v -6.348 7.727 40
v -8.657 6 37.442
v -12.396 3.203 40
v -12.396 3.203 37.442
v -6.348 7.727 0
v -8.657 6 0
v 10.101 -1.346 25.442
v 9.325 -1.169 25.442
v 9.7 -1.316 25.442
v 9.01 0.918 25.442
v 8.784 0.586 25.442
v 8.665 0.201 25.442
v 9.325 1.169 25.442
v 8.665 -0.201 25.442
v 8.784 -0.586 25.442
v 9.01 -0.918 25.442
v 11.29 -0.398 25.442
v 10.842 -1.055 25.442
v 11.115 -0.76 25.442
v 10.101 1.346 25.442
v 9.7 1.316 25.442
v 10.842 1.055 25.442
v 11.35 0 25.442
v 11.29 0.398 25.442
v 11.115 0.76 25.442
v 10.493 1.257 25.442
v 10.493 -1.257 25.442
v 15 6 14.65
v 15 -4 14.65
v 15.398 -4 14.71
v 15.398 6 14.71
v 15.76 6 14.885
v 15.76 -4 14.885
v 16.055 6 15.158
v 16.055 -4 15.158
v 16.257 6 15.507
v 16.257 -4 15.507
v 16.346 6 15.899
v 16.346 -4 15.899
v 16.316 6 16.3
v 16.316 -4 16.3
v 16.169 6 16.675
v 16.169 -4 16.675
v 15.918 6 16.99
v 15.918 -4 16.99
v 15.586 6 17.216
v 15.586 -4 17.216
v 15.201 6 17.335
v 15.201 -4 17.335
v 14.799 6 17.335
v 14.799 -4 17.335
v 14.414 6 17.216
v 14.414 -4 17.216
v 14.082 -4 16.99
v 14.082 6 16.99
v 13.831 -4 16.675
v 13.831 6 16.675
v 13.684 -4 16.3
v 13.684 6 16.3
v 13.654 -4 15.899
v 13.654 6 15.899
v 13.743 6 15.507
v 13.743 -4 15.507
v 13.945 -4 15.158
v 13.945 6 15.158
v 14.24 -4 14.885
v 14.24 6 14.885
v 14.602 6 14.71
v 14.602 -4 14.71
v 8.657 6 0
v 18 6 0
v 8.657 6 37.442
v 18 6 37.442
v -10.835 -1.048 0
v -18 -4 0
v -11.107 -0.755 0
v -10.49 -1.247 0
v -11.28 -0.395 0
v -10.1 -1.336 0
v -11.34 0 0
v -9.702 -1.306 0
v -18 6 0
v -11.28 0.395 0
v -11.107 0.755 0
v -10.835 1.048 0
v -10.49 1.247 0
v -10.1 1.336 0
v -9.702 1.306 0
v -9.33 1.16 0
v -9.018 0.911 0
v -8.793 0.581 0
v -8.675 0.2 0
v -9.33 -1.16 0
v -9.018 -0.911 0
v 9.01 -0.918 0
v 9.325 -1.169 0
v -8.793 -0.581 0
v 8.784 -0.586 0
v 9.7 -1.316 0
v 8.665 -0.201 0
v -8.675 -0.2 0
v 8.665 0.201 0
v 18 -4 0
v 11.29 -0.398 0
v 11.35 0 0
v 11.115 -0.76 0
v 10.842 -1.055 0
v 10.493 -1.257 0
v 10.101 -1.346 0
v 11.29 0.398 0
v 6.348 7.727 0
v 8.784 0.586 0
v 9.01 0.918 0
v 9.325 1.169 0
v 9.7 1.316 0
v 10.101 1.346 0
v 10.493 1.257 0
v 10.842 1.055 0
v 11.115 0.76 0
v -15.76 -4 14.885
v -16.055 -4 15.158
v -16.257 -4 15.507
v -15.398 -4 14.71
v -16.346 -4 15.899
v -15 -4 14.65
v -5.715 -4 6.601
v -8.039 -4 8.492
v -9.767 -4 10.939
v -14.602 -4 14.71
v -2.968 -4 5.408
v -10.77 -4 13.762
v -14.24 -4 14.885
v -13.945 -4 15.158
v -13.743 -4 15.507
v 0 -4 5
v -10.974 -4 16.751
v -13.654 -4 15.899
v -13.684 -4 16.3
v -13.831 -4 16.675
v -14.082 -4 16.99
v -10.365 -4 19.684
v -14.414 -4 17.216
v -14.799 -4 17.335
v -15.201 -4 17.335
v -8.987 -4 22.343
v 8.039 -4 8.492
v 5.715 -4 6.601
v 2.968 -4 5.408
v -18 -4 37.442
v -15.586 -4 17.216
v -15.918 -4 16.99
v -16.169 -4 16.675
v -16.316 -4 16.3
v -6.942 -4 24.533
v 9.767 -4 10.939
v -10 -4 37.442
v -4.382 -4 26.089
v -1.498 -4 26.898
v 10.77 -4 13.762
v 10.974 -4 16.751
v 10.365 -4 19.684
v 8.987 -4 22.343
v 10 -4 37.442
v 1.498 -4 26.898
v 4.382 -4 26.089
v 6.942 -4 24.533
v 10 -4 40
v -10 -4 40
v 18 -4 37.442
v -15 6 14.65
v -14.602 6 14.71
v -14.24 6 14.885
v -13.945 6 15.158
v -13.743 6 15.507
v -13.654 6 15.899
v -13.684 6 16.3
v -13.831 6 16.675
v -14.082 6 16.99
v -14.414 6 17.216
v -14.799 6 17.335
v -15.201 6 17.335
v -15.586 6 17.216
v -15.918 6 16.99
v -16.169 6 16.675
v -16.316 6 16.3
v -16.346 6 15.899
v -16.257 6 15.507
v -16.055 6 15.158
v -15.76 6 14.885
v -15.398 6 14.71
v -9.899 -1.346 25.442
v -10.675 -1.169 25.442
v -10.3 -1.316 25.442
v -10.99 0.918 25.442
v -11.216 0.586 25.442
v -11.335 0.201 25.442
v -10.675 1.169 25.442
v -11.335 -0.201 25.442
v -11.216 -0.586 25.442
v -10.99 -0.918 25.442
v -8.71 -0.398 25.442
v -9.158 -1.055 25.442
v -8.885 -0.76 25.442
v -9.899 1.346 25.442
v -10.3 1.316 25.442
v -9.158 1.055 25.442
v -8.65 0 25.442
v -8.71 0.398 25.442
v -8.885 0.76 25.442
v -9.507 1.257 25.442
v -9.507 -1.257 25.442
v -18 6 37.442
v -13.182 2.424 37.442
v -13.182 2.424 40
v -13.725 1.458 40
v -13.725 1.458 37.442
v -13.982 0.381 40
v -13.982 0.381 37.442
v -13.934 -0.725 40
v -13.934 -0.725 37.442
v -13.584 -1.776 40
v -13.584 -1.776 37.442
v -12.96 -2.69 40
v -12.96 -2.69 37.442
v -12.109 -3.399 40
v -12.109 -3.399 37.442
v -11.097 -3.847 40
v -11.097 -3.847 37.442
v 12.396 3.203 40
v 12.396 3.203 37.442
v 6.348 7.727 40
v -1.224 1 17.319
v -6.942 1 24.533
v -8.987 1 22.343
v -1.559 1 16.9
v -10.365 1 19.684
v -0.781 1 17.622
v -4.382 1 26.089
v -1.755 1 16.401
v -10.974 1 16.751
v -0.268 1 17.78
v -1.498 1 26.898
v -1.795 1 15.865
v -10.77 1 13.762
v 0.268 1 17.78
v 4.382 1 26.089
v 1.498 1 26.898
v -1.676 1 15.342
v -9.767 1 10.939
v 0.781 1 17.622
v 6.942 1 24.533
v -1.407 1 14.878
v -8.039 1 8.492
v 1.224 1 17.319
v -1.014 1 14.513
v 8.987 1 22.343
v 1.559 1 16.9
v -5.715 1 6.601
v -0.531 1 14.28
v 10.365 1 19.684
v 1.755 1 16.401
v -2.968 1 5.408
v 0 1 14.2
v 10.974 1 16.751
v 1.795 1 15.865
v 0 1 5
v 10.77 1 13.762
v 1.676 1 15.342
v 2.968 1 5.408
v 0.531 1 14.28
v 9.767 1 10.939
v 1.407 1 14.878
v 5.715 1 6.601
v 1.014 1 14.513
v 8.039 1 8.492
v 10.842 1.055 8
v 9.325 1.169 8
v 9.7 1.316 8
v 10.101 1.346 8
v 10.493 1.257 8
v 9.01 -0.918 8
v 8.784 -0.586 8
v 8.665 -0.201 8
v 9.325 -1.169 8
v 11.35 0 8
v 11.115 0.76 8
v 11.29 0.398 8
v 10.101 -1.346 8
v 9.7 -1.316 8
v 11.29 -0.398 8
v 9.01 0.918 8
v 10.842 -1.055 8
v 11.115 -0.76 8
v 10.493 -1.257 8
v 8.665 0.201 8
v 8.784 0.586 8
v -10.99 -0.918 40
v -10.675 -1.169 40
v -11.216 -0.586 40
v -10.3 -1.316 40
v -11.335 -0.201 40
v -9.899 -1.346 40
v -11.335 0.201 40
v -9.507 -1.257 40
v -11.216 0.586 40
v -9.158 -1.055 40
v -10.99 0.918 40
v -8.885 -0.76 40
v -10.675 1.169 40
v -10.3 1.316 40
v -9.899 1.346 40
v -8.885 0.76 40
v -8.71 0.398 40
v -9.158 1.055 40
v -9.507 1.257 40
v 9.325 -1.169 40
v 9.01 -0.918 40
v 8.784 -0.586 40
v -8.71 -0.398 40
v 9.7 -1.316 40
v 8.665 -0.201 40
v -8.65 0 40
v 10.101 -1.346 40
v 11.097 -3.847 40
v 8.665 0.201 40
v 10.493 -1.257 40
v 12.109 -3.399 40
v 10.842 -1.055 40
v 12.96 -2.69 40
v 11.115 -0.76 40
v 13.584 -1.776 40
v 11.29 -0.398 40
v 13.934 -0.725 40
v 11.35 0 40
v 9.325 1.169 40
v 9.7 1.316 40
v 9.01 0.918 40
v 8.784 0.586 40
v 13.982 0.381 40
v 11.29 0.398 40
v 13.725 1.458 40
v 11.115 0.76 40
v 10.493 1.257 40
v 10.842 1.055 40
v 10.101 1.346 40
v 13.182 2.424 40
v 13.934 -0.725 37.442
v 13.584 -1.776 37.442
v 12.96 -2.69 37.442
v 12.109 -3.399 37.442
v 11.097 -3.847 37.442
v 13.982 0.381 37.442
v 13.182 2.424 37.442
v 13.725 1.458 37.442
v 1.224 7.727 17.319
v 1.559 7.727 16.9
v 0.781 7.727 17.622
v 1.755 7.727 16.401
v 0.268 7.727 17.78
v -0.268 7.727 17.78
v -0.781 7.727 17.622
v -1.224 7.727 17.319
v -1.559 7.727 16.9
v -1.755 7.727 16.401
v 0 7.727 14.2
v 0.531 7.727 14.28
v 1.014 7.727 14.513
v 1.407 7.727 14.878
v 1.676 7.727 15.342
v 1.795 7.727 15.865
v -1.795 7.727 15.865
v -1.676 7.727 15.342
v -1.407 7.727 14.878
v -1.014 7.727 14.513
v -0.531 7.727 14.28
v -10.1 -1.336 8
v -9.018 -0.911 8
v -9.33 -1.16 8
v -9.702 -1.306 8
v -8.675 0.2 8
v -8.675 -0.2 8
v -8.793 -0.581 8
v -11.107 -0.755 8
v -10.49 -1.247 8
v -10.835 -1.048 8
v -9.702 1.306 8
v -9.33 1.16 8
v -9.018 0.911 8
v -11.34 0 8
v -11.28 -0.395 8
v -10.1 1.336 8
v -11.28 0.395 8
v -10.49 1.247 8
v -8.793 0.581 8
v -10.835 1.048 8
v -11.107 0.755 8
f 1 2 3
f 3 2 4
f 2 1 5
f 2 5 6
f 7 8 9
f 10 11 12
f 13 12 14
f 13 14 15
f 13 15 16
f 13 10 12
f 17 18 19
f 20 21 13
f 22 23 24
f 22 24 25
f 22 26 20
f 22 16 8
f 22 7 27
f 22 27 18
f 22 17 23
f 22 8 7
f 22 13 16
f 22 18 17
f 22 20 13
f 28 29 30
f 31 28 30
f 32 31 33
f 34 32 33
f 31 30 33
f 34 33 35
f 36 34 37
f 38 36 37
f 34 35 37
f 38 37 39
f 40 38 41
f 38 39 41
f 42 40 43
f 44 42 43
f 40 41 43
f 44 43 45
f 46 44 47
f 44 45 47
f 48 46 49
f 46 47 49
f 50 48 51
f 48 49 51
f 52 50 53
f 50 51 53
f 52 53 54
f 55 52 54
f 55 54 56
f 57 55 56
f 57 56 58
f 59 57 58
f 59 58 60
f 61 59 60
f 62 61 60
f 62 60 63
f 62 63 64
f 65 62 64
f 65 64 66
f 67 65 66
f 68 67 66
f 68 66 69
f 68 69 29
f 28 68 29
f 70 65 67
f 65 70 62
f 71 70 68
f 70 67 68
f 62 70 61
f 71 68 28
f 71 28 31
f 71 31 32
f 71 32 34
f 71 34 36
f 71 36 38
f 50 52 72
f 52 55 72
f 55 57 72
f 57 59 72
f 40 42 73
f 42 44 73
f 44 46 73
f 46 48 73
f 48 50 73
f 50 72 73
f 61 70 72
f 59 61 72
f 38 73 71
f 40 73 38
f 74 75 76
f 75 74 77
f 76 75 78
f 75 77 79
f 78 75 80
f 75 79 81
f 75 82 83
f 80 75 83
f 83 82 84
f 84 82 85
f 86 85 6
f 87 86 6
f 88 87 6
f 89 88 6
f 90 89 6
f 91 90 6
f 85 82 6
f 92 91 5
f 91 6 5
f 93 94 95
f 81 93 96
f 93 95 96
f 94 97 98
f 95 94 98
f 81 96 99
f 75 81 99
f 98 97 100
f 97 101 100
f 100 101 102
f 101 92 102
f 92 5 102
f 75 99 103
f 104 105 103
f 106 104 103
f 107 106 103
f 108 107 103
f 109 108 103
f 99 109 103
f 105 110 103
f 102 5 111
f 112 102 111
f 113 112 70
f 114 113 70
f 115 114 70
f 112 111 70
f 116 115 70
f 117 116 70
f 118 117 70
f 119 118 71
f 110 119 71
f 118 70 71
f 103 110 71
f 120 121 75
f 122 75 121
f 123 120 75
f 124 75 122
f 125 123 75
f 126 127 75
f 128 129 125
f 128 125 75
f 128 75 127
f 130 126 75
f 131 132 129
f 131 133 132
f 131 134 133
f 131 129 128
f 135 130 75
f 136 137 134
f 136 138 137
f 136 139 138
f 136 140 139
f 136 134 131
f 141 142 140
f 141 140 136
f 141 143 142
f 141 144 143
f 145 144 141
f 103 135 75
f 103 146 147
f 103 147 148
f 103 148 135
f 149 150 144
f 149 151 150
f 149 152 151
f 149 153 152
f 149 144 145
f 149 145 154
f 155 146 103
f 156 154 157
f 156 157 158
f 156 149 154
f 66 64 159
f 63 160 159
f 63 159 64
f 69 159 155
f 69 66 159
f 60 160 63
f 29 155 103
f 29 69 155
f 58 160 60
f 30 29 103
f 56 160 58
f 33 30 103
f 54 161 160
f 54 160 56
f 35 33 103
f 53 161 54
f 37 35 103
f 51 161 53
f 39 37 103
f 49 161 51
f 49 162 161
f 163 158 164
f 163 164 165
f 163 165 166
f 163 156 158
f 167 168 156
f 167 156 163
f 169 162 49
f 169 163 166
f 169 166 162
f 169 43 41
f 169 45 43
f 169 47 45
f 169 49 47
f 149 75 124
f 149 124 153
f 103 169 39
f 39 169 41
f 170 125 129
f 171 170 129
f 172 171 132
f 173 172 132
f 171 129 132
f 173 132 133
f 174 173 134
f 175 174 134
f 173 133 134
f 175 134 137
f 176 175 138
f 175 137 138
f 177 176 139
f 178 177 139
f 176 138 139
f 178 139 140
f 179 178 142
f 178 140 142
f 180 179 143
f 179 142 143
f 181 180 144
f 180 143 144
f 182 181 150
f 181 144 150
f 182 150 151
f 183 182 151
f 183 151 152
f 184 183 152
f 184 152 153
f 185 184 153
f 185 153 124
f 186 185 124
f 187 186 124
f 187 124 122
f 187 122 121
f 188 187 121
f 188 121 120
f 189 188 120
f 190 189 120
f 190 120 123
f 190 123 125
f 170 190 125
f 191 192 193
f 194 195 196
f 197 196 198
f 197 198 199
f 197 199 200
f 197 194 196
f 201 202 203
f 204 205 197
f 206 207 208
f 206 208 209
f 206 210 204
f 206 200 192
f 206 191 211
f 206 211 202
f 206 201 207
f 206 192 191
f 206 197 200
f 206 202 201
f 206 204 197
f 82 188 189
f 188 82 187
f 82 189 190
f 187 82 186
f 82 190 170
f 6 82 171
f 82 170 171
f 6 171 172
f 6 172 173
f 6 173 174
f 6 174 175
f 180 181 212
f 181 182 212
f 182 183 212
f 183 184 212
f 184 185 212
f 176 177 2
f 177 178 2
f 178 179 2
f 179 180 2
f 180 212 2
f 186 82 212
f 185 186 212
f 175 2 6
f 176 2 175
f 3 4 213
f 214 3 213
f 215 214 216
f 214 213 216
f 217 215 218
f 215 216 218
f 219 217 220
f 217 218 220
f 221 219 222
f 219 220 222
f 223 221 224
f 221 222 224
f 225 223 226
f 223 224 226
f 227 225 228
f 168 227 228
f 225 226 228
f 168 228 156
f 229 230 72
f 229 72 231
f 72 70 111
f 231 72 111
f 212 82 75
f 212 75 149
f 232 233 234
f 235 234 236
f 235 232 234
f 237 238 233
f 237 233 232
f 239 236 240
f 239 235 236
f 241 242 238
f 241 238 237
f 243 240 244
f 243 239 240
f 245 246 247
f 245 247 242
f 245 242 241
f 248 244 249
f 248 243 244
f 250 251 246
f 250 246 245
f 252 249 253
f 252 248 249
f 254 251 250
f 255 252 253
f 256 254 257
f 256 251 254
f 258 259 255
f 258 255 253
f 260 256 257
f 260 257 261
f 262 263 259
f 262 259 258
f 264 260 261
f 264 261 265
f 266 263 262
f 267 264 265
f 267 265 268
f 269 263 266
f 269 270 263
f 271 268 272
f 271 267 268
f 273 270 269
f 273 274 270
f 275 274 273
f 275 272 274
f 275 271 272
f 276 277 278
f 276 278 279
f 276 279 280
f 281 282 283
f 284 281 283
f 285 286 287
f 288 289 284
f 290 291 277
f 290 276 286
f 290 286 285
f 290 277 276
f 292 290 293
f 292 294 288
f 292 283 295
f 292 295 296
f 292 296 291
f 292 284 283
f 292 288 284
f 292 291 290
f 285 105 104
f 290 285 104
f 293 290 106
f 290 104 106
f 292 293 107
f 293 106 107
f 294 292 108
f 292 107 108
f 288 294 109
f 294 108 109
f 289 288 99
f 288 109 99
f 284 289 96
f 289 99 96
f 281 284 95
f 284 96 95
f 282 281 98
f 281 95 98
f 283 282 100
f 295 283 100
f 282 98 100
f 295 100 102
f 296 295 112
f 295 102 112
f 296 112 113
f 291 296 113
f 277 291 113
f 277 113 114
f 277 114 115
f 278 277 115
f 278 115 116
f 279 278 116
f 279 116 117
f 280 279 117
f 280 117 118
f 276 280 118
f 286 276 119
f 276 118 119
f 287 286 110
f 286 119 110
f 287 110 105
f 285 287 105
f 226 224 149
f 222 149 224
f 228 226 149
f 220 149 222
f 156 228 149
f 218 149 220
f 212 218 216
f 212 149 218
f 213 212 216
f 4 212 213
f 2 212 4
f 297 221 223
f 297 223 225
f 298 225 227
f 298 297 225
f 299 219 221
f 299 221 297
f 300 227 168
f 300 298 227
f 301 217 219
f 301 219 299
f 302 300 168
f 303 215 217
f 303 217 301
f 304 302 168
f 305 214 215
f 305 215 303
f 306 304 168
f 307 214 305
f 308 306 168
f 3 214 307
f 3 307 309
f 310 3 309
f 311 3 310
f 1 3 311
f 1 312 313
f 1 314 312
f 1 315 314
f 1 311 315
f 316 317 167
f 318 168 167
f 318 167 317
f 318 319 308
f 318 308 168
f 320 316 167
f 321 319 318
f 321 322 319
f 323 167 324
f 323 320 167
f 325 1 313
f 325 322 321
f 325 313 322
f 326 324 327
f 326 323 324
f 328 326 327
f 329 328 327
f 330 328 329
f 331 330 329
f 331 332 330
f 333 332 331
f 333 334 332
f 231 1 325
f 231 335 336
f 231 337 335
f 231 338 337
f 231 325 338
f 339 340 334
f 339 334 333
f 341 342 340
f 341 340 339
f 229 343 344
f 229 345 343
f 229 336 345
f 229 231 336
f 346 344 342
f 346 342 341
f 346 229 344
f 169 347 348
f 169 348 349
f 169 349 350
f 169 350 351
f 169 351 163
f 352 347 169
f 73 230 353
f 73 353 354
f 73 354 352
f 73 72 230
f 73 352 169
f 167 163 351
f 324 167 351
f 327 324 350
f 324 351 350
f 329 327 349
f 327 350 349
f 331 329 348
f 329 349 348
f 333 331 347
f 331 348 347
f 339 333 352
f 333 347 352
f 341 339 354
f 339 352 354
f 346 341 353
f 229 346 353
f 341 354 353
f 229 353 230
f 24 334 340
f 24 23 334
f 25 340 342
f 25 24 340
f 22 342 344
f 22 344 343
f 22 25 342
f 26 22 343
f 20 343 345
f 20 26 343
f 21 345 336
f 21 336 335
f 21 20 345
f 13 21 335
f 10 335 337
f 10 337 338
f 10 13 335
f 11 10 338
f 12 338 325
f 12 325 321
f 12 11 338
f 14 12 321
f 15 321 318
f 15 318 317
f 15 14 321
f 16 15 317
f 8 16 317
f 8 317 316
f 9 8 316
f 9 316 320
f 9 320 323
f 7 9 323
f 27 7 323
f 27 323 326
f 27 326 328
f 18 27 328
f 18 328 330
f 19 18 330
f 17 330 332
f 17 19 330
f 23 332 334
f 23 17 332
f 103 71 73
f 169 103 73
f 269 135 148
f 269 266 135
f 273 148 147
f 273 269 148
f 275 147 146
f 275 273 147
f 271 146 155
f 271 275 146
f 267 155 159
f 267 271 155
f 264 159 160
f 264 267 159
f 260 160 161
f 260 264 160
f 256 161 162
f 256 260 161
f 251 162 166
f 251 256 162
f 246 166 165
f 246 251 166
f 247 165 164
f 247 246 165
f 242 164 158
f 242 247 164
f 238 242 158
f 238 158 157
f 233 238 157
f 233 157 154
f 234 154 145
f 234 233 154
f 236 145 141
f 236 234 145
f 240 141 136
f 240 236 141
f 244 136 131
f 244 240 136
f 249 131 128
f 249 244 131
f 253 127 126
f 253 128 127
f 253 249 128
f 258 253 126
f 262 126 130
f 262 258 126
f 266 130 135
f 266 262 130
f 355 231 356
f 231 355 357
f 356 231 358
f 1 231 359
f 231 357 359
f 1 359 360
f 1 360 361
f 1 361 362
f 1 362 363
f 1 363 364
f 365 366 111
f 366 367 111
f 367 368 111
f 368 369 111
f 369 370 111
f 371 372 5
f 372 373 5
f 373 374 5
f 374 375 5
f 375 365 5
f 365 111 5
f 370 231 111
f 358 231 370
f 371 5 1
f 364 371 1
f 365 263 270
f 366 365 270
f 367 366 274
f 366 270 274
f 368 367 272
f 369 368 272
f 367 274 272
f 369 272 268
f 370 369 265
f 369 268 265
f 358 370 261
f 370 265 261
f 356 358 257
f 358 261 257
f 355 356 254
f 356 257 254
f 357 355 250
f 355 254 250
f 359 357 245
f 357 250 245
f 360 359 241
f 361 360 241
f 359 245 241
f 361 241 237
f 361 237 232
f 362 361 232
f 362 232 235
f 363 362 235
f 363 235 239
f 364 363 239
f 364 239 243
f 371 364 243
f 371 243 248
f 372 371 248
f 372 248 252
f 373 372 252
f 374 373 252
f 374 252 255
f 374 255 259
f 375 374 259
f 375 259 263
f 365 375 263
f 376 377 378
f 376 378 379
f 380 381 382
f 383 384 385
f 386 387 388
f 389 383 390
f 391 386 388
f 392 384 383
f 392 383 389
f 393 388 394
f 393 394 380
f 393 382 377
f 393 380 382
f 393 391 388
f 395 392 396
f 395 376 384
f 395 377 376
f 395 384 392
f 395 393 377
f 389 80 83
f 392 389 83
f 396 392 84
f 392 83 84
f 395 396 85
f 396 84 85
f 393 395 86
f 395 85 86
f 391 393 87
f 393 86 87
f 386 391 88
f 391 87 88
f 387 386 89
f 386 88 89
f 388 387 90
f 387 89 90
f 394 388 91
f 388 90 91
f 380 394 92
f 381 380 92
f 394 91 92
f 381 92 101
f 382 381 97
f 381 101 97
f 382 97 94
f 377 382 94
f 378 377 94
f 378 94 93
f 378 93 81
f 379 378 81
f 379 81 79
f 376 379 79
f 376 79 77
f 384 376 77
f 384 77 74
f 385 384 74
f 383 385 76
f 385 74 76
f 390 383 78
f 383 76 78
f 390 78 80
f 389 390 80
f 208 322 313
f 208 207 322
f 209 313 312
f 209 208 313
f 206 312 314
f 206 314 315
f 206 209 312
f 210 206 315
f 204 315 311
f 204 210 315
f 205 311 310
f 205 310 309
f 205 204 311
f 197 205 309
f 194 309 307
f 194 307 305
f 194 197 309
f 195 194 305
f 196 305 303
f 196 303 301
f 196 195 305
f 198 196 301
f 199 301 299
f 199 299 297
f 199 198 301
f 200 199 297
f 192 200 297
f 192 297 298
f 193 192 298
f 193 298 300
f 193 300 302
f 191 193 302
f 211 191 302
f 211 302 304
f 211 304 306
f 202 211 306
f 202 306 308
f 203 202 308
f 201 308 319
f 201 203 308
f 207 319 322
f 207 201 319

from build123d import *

# Parameters (mm, degrees)
SKETCH_1_R          = 1.35
EXTRUDE_1_DEPTH     = 40
EXTRUDE_2_DEPTH     = 10
SKETCH_3_W          = 36
SKETCH_3_H          = 37.441664415
SKETCH_3_R          = 11
EXTRUDE_3_DEPTH     = 5
SKETCH_4_R          = 1.8
CUT_EXTRUDE_1_DEPTH = 18
SKETCH_5_R          = 1.35
CUT_EXTRUDE_2_DEPTH = 18
CUT_EXTRUDE_START   = -5
SKETCH_6_R          = 11
CUT_EXTRUDE_3_DEPTH = 5
SKETCH_7_W          = 36
SKETCH_7_H          = 37.441664415
CUT_EXTRUDE_4_DEPTH = 5
CUT_EXTRUDE_START_2 = -12
SKETCH_8_R          = 1.35
CUT_EXTRUDE_5_DEPTH = 12
SKETCH_10_R         = 1.34
SKETCH_10_R_2       = 1.35
CUT_EXTRUDE_6_DEPTH = 8


with BuildPart() as part:
    # 草图1 → 凸台-拉伸1 (new body)
    with BuildSketch(Plane.XY):
        with BuildLine():
            Line((-10, -4), (10, -4))
            ThreePointArc((10, -4), (13.795550466, -1.262456597), (12.395858862, 3.203101671))
            Line((12.395858862, 3.203101671), (6.347732719, 7.726984491))
            Line((6.347732719, 7.726984491), (0, 7.726984491))
            Line((0, 7.726984491), (-6.347732719, 7.726984491))
            Line((-6.347732719, 7.726984491), (-12.395858862, 3.203101671))
            ThreePointArc((-12.395858862, 3.203101671), (-13.795550466, -1.262456597), (-10, -4))
        make_face()
        with Locations((10, 0)):
            Circle(SKETCH_1_R, mode=Mode.SUBTRACT)
        with Locations((-10, 0)):
            Circle(SKETCH_1_R, mode=Mode.SUBTRACT)
    extrude(amount=EXTRUDE_1_DEPTH)

    # 草图2 → 凸台-拉伸2 (add)
    with BuildSketch(Plane.XZ.offset(4)):
        Polygon((-10, 37.441664415), (-18, 37.441664415), (-18, 0), (0, 0), (10, 0), (18, 0), (18, 37.441664415), align=None)
    extrude(amount=-EXTRUDE_2_DEPTH)

    # 草图3 → 凸台-拉伸3 (add)
    with BuildSketch(Plane.XZ.offset(4)):
        with Locations((0, 18.720832208)):
            Rectangle(SKETCH_3_W, SKETCH_3_H)
        with Locations(Location((0, 16, 0), (0, 0, 270))):
            Circle(SKETCH_3_R, mode=Mode.SUBTRACT)
    extrude(amount=EXTRUDE_3_DEPTH)

    # 草图4 → 切除-拉伸1 (cut)
    with BuildSketch(Plane.XZ.offset(4)):
        with Locations(Location((0, 16, 0), (0, 0, 270))):
            Circle(SKETCH_4_R)
    extrude(amount=-CUT_EXTRUDE_1_DEPTH, mode=Mode.SUBTRACT)

    # 草图5 → 切除-拉伸2 (cut)
    with BuildSketch(Plane.XZ.offset(9)):
        with Locations(Location((-15, 16, 0), (0, 0, 270))):
            Circle(SKETCH_5_R)
        with Locations(Location((15, 16, 0), (0, 0, 270))):
            Circle(SKETCH_5_R)
    extrude(amount=-CUT_EXTRUDE_2_DEPTH, mode=Mode.SUBTRACT)

    # 草图6 → 切除-拉伸3 (cut)
    with BuildSketch(Plane.XZ.offset(4).offset(CUT_EXTRUDE_START)):
        with Locations(Location((0, 16, 0), (0, 0, 270))):
            Circle(SKETCH_6_R)
    extrude(amount=CUT_EXTRUDE_3_DEPTH, mode=Mode.SUBTRACT)

    # 草图7 → 切除-拉伸4 (cut)
    with BuildSketch(Plane.XZ.offset(9)):
        with Locations((0, 18.720832208)):
            Rectangle(SKETCH_7_W, SKETCH_7_H)
    extrude(amount=-CUT_EXTRUDE_4_DEPTH, mode=Mode.SUBTRACT)

    # 草图8 → 切除-拉伸5 (cut)
    with BuildSketch(Plane.XY.offset(37.441664415).offset(CUT_EXTRUDE_START_2)):
        with Locations((10, 0)):
            Circle(SKETCH_8_R)
        with Locations((-10, 0)):
            Circle(SKETCH_8_R)
    extrude(amount=CUT_EXTRUDE_5_DEPTH, mode=Mode.SUBTRACT)

    # 草图10 → 切除-拉伸6 (cut)
    with BuildSketch(Plane(origin=(0, 0, 0), x_dir=(-1, 0, 0), z_dir=(0, 0, -1))):
        with Locations((10, 0)):
            Circle(SKETCH_10_R)
        with Locations(Location((-10, 0, 0), (0, 0, 180))):
            Circle(SKETCH_10_R_2)
    extrude(amount=-CUT_EXTRUDE_6_DEPTH, mode=Mode.SUBTRACT)


solid = part.part
